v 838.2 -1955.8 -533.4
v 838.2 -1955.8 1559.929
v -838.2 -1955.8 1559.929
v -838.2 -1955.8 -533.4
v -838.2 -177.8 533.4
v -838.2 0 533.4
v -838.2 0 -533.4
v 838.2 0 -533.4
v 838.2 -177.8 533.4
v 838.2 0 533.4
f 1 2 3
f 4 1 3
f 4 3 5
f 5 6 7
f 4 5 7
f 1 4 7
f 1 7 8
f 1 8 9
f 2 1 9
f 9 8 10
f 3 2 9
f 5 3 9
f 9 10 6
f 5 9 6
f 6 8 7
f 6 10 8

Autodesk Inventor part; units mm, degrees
ref_plane "YZ Plane" through (0, 0, 0) normal (1, 0, 0) x (0, 1, 0)
ref_plane "XZ Plane" through (0, 0, 0) normal (0, 1, 0) x (-1, 0, 0)
ref_plane "XY Plane" through (0, 0, 0) normal (0, 0, 1) x (1, 0, 0)
sketch "Sketch1" plane through (0, 0, 0) normal (0, 1, 0) x (-1, 0, 0)
  line L0 (-838.2, 533.4) -> (838.2, 533.4)
  line L1 (838.2, 533.4) -> (838.2, -533.4)
  line L2 (838.2, -533.4) -> (-838.2, -533.4)
  line L3 (-838.2, -533.4) -> (-838.2, 533.4)
  line L4 (-838.2, 533.4) -> (838.2, -533.4) construction
  line L5 (838.2, 533.4) -> (-838.2, -533.4) construction
  point P0 (0, 0)
  dimension "d0" = 1676.4
  dimension "d1" = 1066.8
extrude "Extrusion1" add sketch "Sketch1" against normal blind 1955.8
sketch "Sketch2" plane through (838.2, 0, 533.4) normal (1, 0, 0) x (0, 0, -1)
  line L0 (0, 0) -> (0, -1955.8) projected
  line L1 (0, -177.8) -> (0, -1955.8)
  line L2 (0, -1955.8) -> (-1026.5288, -1955.8)
  line L3 (-1026.5288, -1955.8) -> (0, -177.8)
  line L4 (0, 0) -> (1066.8, 0) projected
  point P0 (533.4, 0)
  dimension "d4" = 30
  dimension "d5" = 177.8
extrude "Extrusion2" add sketch "Sketch2" against normal up to surface (1676.4 mm away)
properties part number "Side near railing 7" material "Concrete"
